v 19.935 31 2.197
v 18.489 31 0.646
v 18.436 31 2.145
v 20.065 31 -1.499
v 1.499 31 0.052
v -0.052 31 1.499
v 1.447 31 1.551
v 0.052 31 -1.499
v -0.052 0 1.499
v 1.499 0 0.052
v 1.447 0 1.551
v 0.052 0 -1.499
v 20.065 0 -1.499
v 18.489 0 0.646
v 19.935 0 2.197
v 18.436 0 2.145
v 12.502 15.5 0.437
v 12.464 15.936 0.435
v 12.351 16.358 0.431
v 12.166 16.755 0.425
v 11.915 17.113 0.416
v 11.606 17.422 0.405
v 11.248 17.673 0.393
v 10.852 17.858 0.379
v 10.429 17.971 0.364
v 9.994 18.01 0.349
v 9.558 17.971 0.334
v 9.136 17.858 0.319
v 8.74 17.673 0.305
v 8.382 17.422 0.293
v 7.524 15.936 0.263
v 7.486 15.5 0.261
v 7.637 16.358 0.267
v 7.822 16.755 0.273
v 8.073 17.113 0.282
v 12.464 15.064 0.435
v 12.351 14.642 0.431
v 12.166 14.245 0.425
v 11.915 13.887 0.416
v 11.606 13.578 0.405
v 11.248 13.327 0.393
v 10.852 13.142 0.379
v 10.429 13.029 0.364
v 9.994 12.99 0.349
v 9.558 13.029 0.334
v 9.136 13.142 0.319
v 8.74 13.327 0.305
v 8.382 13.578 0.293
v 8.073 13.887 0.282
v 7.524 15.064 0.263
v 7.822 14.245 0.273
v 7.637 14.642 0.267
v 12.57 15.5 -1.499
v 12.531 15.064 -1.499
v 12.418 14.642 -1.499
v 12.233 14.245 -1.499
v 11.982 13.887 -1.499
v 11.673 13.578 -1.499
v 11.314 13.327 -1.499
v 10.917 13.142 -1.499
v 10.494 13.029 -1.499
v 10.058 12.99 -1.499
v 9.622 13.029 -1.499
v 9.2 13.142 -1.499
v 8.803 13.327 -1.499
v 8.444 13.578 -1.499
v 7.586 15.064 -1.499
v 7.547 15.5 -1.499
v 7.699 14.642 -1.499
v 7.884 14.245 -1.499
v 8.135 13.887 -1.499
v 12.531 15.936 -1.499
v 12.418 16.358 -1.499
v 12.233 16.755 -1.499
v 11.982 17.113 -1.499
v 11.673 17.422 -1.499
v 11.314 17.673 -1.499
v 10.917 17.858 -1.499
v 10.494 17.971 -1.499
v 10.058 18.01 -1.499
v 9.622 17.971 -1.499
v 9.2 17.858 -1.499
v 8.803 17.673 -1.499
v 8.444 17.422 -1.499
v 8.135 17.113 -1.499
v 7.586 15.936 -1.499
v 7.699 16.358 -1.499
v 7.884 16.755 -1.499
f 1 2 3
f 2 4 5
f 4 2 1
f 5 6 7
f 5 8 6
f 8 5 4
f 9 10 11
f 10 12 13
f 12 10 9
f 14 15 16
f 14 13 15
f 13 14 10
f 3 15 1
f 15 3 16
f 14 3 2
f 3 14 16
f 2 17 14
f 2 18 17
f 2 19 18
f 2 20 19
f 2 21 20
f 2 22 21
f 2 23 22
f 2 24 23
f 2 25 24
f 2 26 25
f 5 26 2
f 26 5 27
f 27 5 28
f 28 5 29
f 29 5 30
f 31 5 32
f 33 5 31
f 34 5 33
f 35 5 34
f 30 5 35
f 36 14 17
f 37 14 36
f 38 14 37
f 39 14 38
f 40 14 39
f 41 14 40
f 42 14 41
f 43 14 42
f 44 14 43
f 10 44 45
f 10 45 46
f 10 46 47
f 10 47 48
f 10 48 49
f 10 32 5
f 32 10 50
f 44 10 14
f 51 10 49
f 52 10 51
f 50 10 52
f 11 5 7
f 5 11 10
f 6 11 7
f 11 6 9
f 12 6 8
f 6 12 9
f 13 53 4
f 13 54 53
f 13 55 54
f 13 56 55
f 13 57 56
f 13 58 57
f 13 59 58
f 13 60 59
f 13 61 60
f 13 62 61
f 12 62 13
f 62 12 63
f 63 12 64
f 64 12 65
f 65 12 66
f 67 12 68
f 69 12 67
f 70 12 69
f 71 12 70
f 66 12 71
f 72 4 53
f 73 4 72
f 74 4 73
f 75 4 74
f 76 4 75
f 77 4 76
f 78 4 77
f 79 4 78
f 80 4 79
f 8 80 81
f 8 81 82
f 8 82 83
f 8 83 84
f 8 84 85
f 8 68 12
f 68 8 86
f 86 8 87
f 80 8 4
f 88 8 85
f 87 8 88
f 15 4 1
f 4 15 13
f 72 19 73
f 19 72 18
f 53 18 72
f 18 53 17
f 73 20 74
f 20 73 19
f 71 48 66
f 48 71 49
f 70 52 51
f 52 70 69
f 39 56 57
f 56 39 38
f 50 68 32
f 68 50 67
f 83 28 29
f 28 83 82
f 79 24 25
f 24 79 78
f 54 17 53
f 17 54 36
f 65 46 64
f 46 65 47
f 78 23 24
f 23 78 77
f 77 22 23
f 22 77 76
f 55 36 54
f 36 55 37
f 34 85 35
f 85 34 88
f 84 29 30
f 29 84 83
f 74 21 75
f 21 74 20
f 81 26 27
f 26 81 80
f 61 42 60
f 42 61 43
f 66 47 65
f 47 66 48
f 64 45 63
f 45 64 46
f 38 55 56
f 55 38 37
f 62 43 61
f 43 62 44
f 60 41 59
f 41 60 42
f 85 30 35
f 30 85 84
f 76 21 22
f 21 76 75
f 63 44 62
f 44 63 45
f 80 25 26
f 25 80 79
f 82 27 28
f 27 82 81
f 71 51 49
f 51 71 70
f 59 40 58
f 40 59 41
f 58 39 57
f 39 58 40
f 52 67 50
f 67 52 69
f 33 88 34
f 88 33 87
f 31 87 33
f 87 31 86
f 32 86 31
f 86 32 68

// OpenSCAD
rake_angle = 2; // Ceiling or rafter angle in degrees
seat_height = 1.5; // How tall should seating ridges be in mm
seat_width = 1.5; // How wide should seating ridges be on either side of shim
min_shim_depth = 1.5; // Minimum depth of the shim, not including seat part
rotate_shim = true; // Orientates shim horizontally for faster printing

/* [ Hidden ] */
$fn = 36;
vidga_length = 31;
vidga_width = 17;
vidga_screw_diameter = 5;
vidga_screw_radius = vidga_screw_diameter / 2;

shim_width = vidga_width + (2 * seat_width);
shim_length = vidga_length;

// from wiki  https://en.wikibooks.org/wiki/OpenSCAD_User_Manual/undersized_circular_objects
module cylinder_outer(height,radius){
   fudge = 1/cos(180/$fn);
   cylinder(h=height,r=radius*fudge);}

// tan(x) * A = O
opposite_length = tan(rake_angle) * shim_width;

// draw out the shim, then extrude
points = [
    [0, -min_shim_depth],
    [shim_width, -min_shim_depth - opposite_length],
    [shim_width, seat_height],
    [shim_width - seat_width, seat_height],
    [shim_width - seat_width, 0],
    [seat_width, 0],
    [seat_width, seat_height],
    [0, seat_height]
];

rotate([
   0,
      rotate_shim ? -rake_angle : 0,
   0
   ]) difference() {
    translate([0, shim_length, 0]) rotate([90, 0, 0]) linear_extrude(shim_length) polygon(points);

    // make a hole for the screw
    translate([shim_width / 2, shim_length /2, -opposite_length -min_shim_depth]) cylinder_outer(opposite_length + min_shim_depth, vidga_screw_radius);
}
